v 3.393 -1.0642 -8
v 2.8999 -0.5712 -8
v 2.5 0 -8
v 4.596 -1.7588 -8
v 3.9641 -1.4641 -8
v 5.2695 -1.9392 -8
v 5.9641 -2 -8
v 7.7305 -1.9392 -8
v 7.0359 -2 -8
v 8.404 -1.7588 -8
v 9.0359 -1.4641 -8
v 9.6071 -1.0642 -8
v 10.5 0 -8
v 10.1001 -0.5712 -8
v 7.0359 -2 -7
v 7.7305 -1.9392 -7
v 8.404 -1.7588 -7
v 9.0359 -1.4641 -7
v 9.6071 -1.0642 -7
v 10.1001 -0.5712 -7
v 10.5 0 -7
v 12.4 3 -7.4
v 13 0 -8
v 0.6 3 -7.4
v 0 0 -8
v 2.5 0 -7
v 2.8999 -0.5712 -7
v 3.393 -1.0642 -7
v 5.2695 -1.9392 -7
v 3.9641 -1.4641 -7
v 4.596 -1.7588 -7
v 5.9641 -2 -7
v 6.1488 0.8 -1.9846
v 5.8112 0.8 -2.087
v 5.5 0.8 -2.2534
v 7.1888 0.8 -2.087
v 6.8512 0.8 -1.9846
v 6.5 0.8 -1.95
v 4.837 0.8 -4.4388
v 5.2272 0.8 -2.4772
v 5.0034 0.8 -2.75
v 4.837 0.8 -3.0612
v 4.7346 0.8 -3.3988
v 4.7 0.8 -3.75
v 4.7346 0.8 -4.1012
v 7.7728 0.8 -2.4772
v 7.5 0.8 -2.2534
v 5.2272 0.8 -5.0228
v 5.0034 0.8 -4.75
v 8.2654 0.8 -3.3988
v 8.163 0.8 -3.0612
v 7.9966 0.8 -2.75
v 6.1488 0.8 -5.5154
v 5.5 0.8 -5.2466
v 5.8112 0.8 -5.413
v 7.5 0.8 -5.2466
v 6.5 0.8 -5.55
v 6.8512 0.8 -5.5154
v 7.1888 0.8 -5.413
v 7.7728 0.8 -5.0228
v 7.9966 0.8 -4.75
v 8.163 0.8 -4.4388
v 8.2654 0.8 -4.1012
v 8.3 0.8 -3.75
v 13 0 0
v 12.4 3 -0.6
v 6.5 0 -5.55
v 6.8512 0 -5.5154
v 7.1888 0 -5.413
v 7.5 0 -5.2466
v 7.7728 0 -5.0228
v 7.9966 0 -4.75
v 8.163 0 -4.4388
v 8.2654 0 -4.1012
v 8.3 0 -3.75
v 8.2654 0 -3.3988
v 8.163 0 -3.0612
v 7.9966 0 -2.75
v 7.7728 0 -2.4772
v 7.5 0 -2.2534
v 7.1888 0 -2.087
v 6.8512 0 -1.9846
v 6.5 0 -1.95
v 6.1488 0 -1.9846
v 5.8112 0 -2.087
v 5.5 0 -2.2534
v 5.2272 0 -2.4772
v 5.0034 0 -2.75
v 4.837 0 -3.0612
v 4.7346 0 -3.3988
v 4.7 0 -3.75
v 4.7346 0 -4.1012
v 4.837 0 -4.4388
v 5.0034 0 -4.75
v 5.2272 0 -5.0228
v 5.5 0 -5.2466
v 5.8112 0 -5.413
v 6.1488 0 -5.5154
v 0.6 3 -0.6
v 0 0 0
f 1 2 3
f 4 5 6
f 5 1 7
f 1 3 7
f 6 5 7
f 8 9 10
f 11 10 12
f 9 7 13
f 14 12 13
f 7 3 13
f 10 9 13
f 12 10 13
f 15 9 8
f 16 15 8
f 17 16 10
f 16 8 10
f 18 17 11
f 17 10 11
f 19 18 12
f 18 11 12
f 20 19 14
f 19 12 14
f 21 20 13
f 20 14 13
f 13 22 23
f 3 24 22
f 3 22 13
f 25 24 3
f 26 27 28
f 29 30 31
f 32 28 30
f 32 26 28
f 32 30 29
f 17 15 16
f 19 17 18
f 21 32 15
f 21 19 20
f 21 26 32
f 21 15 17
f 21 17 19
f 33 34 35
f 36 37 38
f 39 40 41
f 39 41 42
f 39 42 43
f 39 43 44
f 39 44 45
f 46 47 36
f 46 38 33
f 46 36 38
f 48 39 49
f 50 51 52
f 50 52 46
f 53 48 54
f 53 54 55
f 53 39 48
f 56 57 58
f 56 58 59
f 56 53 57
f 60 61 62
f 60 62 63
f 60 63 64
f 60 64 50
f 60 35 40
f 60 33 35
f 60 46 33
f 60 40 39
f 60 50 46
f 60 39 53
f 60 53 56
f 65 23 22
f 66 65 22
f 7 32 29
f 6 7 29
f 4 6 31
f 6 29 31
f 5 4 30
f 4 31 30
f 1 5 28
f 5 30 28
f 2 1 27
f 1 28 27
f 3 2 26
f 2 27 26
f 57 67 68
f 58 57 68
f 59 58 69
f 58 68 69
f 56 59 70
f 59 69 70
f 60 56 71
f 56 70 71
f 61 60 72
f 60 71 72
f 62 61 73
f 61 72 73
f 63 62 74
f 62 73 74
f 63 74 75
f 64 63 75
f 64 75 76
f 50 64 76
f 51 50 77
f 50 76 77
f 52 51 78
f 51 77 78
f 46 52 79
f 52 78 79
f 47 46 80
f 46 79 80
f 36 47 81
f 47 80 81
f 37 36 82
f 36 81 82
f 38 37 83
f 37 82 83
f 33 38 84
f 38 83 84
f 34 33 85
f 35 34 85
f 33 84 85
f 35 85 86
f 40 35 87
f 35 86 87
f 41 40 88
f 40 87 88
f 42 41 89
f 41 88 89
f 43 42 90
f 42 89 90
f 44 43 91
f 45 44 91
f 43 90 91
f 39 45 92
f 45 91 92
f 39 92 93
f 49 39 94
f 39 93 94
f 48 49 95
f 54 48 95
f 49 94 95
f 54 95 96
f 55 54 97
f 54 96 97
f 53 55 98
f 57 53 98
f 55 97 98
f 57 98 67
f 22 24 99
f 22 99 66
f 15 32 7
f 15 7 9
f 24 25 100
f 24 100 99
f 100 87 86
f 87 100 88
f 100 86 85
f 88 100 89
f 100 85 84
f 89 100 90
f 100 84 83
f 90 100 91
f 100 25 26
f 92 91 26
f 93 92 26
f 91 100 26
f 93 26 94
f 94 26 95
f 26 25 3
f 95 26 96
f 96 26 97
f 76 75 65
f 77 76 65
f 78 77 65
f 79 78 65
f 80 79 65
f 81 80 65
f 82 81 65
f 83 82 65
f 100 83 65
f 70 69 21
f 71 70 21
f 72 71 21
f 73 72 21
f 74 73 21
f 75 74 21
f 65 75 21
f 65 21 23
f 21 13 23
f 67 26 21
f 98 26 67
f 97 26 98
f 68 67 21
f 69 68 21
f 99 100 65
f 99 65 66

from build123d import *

# Parameters (mm, degrees)
SKETCH1_W               = 13
SKETCH1_H               = 8
BOSS_EXTRUDE1_DEPTH     = 3
CUT_EXTRUDE1_DEPTH      = 16.556349186
CUT_EXTRUDE1_DEPTH_BACK = 16.556349186
CUT_EXTRUDE2_DEPTH      = 16.556349186
CUT_EXTRUDE2_DEPTH_BACK = 16.556349186
SKETCH4_R               = 1.8
CUT_EXTRUDE3_DEPTH      = 0.8
SKETCH5_W               = 8
SKETCH5_H               = 1
BOSS_EXTRUDE2_DEPTH     = 2
FILLET1_R               = 4


with BuildPart() as part:
    # Sketch1 → Boss-Extrude1 (new body)
    with BuildSketch(Plane(origin=(0, 0, 0), x_dir=(1, 0, 0), z_dir=(0, 1, 0))):
        with Locations((6.5, 4)):
            Rectangle(SKETCH1_W, SKETCH1_H)
    extrude(amount=BOSS_EXTRUDE1_DEPTH)

    # Sketch2 → Cut-Extrude1 (cut, two sides: drawn at the far end of the back side and taken through both)
    with BuildSketch(Plane.XY.offset(-CUT_EXTRUDE1_DEPTH_BACK)):
        Polygon((0, 0), (0.6, 3), (0, 3), align=None)
        Polygon((13, 0), (12.4, 3), (13, 3), align=None)
    extrude(amount=CUT_EXTRUDE1_DEPTH + CUT_EXTRUDE1_DEPTH_BACK, mode=Mode.SUBTRACT)

    # Sketch3 → Cut-Extrude2 (cut, two sides: drawn at the far end of the back side and taken through both)
    with BuildSketch(Plane(origin=(0, 0, 0), x_dir=(0, 0, -1), z_dir=(1, 0, 0)).offset(-CUT_EXTRUDE2_DEPTH_BACK)):
        Polygon((0, 0), (0.6, 3), (0, 3), align=None)
        Polygon((8, 3), (7.4, 3), (8, 0), align=None)
    extrude(amount=CUT_EXTRUDE2_DEPTH + CUT_EXTRUDE2_DEPTH_BACK, mode=Mode.SUBTRACT)

    # Sketch4 → Cut-Extrude3 (cut)
    with BuildSketch(Plane.XZ):
        with Locations(Location((6.50000125, -3.75, 0), (0, 0, 270))):
            Circle(SKETCH4_R)
    extrude(amount=-CUT_EXTRUDE3_DEPTH, mode=Mode.SUBTRACT)

    # Sketch5 → Boss-Extrude2 (add)
    with BuildSketch(Plane.XZ):
        with Locations((6.500011, -7.5)):
            Rectangle(SKETCH5_W, SKETCH5_H)
    extrude(amount=BOSS_EXTRUDE2_DEPTH)

    # Fillet1
    # the kernel refuses this fillet: 4 mm, written as the material it takes off along each edge
    with BuildSketch(Plane(origin=(10.500011, -2, -16.660254038), x_dir=(0, 1, 0), z_dir=(0, 0, 1)), Plane(origin=(2.500011, -2, 1.660254038), x_dir=(0, 1, 0), z_dir=(0, 0, -1))) as fillet1_piece_1:
        with BuildLine():
            CenterArc((4, 3.464101615), FILLET1_R, 180, 60)
            Line((0, 3.464101615), (-0.08, 3.464101615))
            Line((-0.08, 3.464101615), (-0.08, 0))
            Line((-0.08, 0), (0, -0.08))
            ThreePointArc((0, -0.08), (1, -0.08), (1.96, -0.069282032))
            Line((1.96, -0.069282032), (2, 0))
        make_face()
    extrude(amount=18.320508076, mode=Mode.SUBTRACT)


solid = part.part
